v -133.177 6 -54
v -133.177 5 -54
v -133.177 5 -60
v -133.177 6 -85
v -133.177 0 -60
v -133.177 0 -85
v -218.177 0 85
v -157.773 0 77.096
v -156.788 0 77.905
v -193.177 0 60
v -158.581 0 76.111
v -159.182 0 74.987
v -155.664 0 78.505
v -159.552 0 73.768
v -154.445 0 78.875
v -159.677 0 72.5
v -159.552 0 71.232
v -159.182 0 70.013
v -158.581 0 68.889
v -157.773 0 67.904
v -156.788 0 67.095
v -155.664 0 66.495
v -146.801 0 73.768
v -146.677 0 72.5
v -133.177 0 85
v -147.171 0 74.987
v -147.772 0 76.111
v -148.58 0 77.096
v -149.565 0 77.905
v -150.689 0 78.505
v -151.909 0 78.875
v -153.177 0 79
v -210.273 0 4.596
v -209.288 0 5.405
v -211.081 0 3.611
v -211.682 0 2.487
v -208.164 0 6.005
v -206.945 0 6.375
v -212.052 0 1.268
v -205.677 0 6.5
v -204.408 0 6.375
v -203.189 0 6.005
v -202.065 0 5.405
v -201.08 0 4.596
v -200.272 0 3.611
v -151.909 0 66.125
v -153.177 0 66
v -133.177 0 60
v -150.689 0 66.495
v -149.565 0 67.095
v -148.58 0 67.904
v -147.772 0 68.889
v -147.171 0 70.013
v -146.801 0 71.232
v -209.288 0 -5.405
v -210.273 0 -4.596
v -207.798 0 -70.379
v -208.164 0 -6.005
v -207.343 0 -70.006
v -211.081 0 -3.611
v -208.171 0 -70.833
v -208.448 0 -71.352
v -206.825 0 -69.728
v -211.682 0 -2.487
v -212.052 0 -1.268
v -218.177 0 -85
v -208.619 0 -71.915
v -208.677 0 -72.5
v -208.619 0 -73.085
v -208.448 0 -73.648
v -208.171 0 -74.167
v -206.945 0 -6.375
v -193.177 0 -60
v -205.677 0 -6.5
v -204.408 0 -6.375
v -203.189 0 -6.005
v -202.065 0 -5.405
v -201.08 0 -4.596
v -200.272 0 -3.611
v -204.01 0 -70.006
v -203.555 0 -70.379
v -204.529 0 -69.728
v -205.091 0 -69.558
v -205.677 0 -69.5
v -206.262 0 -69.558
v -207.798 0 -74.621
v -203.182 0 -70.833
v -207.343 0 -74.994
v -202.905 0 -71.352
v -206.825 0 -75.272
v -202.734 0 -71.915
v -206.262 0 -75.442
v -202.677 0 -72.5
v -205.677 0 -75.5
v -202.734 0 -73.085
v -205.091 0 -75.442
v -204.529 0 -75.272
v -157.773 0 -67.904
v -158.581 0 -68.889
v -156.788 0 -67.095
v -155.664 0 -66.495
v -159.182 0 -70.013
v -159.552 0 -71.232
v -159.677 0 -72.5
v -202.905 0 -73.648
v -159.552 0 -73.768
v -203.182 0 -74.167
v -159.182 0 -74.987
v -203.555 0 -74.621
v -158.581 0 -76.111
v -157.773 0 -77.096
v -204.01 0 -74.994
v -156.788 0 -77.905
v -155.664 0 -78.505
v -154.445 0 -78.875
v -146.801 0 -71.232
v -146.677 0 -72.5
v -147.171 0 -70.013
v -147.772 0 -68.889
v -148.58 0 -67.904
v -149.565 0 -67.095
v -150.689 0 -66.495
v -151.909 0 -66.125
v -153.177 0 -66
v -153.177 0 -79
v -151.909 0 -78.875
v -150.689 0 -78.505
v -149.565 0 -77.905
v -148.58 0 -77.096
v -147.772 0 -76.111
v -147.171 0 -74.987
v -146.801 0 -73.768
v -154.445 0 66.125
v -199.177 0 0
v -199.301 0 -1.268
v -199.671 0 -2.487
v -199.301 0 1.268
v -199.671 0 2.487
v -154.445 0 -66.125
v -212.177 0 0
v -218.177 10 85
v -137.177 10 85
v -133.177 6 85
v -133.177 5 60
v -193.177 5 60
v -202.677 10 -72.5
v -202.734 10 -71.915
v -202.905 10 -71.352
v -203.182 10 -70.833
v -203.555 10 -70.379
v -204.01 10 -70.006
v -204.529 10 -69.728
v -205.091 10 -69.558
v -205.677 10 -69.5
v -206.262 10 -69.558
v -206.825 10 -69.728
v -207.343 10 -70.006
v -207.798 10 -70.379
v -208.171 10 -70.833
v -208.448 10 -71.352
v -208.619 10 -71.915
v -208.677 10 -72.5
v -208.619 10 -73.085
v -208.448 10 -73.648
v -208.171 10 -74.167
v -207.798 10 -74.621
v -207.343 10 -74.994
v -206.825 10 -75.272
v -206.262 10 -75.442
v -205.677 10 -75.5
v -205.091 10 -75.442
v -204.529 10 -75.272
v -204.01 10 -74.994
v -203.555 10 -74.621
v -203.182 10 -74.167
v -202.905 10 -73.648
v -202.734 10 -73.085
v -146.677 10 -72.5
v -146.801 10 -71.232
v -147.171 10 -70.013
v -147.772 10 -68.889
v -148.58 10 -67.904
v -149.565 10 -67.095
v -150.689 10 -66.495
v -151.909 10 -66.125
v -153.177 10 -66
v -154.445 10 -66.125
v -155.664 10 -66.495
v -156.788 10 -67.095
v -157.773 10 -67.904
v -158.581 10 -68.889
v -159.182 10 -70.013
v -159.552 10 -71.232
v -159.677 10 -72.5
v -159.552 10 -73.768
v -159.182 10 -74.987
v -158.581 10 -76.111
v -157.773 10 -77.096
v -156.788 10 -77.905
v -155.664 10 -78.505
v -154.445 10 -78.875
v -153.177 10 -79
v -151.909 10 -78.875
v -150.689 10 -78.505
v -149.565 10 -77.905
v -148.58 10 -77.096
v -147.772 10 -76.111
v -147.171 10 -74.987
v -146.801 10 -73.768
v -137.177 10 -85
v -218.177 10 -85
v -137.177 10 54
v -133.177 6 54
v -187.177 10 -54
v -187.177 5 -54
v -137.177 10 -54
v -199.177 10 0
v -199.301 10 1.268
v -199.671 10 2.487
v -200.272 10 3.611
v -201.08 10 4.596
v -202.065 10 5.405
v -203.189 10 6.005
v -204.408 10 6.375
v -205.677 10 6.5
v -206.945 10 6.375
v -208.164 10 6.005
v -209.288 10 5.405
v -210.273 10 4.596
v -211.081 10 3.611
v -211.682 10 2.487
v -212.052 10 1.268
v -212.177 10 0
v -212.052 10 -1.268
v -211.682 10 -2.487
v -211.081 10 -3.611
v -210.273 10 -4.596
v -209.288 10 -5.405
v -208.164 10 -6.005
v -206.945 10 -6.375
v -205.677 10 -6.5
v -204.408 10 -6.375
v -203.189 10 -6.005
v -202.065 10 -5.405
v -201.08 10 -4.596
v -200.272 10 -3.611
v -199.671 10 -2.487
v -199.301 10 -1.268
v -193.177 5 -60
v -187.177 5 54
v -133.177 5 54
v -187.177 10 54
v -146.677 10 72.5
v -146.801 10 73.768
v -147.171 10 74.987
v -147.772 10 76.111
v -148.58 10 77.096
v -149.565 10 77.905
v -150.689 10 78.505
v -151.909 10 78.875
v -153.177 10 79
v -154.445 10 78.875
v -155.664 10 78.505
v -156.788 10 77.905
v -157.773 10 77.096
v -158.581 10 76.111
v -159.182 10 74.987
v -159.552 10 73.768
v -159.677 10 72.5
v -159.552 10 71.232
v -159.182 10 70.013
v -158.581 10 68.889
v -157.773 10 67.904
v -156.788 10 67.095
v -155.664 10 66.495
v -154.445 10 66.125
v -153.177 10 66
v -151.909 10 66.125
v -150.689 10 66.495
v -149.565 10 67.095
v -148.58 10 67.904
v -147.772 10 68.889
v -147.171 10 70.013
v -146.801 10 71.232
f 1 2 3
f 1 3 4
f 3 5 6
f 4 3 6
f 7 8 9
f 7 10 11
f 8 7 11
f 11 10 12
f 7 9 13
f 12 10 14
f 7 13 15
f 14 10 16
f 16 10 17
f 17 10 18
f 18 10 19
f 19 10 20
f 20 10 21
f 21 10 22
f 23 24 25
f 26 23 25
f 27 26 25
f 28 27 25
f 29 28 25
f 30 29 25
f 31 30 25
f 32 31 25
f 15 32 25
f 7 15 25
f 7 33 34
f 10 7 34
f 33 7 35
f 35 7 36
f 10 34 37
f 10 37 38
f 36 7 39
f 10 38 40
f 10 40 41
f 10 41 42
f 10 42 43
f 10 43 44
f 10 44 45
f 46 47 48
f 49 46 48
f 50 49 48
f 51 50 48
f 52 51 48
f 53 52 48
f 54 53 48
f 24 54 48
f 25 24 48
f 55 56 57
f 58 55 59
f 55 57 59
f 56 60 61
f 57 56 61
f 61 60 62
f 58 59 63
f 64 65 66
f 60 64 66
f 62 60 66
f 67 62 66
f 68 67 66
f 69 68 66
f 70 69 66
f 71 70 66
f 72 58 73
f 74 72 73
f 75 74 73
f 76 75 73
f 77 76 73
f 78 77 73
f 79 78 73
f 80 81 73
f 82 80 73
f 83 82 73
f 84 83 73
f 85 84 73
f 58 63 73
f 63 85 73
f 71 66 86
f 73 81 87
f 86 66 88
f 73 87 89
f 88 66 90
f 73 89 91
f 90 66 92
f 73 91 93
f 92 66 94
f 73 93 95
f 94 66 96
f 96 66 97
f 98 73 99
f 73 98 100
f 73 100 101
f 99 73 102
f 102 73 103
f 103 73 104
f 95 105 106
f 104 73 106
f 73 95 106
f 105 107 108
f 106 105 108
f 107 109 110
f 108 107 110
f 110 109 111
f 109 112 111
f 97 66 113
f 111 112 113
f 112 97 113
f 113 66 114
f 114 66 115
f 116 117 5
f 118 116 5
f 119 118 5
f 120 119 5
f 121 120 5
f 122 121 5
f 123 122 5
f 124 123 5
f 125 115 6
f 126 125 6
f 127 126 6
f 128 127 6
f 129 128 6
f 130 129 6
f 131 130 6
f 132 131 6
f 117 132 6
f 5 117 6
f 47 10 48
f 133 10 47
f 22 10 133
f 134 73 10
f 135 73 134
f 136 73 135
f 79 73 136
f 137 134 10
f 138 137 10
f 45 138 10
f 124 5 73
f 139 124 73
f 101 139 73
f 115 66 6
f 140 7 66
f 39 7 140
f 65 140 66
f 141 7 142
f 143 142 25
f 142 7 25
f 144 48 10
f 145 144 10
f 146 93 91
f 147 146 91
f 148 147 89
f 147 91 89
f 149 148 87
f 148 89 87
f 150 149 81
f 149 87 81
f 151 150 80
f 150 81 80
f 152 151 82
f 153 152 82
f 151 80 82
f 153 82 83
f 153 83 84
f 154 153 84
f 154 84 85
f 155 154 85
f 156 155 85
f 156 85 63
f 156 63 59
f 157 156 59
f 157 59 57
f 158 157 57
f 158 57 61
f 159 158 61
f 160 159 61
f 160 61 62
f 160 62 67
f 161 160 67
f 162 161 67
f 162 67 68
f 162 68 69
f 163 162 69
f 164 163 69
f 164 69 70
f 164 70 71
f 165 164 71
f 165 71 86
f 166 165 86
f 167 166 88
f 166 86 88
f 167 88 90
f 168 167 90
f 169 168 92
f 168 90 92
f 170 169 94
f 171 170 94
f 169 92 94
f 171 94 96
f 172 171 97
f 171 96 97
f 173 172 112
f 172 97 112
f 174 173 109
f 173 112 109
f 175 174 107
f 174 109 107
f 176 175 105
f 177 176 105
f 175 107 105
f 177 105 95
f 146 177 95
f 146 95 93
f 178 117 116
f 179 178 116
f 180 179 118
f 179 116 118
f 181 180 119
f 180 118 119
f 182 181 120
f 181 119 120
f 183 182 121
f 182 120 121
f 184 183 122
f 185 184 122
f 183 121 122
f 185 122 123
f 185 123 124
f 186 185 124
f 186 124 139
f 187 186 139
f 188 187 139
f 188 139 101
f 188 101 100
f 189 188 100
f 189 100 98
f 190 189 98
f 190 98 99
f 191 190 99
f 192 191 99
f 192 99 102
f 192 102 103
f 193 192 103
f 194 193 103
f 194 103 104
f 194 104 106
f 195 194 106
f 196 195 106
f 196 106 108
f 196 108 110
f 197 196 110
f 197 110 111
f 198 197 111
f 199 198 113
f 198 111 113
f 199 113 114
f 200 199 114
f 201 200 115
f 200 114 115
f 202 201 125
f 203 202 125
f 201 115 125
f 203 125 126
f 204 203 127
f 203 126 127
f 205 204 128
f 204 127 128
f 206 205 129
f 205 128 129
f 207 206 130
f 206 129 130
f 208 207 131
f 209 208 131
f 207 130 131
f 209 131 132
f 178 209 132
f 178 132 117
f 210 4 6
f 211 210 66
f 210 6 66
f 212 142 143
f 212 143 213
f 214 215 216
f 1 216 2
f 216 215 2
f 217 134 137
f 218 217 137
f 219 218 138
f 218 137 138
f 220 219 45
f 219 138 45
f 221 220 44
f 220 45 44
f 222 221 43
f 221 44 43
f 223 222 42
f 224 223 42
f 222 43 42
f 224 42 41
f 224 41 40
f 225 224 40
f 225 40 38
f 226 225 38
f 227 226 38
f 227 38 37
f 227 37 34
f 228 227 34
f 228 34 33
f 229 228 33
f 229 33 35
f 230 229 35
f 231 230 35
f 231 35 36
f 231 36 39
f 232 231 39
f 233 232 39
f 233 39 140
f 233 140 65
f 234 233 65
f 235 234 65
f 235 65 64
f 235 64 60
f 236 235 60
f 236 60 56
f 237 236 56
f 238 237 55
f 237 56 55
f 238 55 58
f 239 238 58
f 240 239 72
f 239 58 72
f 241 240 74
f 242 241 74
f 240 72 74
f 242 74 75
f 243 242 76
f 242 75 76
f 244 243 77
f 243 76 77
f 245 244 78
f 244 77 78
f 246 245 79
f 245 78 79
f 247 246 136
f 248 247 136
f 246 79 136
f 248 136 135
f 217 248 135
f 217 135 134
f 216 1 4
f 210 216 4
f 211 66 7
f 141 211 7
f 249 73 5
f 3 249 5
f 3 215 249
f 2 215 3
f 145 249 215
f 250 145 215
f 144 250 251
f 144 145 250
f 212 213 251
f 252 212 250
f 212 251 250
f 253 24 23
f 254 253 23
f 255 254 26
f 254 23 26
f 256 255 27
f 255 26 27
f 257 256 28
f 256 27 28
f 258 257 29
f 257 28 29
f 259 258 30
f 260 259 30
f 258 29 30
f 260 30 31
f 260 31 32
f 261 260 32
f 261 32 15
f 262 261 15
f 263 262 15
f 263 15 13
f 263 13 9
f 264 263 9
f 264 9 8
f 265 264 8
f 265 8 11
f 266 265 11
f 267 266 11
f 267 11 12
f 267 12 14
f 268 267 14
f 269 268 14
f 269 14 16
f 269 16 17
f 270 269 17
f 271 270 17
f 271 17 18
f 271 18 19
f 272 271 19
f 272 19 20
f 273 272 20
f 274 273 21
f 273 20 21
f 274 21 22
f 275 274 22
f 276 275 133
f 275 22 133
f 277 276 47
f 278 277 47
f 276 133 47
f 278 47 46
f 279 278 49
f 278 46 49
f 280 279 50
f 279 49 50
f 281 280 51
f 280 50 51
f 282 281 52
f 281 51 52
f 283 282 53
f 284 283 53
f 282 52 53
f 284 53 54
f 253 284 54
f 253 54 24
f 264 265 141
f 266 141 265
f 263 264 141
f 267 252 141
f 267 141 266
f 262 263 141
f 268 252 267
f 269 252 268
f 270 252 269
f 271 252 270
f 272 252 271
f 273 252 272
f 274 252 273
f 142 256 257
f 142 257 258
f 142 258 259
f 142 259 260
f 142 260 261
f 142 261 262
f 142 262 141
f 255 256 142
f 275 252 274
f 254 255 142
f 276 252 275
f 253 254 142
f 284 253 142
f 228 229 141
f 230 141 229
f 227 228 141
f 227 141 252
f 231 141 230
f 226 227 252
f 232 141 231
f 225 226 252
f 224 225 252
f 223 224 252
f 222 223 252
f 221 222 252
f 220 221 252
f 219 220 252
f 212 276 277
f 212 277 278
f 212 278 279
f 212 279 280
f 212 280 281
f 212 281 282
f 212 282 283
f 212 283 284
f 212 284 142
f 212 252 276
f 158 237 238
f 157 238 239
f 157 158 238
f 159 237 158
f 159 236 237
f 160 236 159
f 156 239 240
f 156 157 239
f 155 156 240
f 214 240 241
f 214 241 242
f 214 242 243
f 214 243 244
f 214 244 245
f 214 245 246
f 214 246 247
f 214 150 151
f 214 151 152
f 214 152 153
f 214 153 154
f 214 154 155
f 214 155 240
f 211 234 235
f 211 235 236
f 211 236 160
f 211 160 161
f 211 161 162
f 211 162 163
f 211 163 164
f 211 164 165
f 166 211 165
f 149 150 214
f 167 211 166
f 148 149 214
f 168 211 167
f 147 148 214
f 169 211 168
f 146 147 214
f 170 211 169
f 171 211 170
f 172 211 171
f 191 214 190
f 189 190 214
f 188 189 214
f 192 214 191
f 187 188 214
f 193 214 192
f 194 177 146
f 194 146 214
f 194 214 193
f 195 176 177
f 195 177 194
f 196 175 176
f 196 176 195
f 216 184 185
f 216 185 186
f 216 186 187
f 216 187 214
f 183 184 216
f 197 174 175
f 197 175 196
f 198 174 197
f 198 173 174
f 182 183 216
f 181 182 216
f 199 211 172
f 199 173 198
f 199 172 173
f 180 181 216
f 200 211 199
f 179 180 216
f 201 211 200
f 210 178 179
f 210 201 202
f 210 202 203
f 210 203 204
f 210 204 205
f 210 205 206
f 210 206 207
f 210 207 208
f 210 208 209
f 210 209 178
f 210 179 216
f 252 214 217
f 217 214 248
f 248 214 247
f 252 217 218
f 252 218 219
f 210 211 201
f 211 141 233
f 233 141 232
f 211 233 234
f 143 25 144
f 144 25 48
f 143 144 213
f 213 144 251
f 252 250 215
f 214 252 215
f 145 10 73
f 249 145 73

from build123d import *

# Parameters (mm, degrees)
BOSS_EXTRUDE1_DEPTH = 10
CUT_EXTRUDE1_DEPTH  = 5
CHAMFER1_SIZE       = 4
SKETCH3_R           = 6.5
CUT_EXTRUDE2_DEPTH  = 11
SKETCH7_R           = 3
CUT_EXTRUDE3_DEPTH  = 11


with BuildPart() as part:
    # Sketch1 → Boss-Extrude1 (new body)
    with BuildSketch(Plane(origin=(0, 0, 0), x_dir=(1, 0, 0), z_dir=(0, 1, 0))):
        Polygon((-133.17660268, -85), (-133.17660268, -54), (-187.17660268, -54), (-187.17660268, 54), (-133.17660268, 54), (-133.17660268, 85), (-218.17660268, 85), (-218.17660268, -85), align=None)
    extrude(amount=BOSS_EXTRUDE1_DEPTH)

    # Sketch2 → Cut-Extrude1 (cut)
    with BuildSketch(Plane.XZ):
        Polygon((-133.17660268, 60), (-193.17660268, 60), (-193.17660268, -60), (-133.17660268, -60), (-133.17660268, -54), (-187.17660268, -54), (-187.17660268, 54), (-133.17660268, 54), align=None)
    extrude(amount=-CUT_EXTRUDE1_DEPTH, mode=Mode.SUBTRACT)

    # Chamfer1
    chamfer1_edges = [part.edges().sort_by_distance(p)[0] for p in [
        (-133.17660268, 10, 69.5),
        (-133.17660268, 10, -69.5),
    ]]
    chamfer(chamfer1_edges, length=CHAMFER1_SIZE)

    # Sketch3 → Cut-Extrude2 (cut, through all)
    with BuildSketch(Plane.XZ):
        with Locations((-153.17660268, -72.5)):
            Circle(SKETCH3_R)
        with Locations((-153.17660268, 72.5)):
            Circle(SKETCH3_R)
        with Locations((-205.676562711, 0)):
            Circle(SKETCH3_R)
    extrude(amount=-CUT_EXTRUDE2_DEPTH, mode=Mode.SUBTRACT)

    # Sketch7 → Cut-Extrude3 (cut, through all)
    with BuildSketch(Plane.XZ):
        with Locations((-205.67660268, -72.5)):
            Circle(SKETCH7_R)
    extrude(amount=-CUT_EXTRUDE3_DEPTH, mode=Mode.SUBTRACT)


solid = part.part
